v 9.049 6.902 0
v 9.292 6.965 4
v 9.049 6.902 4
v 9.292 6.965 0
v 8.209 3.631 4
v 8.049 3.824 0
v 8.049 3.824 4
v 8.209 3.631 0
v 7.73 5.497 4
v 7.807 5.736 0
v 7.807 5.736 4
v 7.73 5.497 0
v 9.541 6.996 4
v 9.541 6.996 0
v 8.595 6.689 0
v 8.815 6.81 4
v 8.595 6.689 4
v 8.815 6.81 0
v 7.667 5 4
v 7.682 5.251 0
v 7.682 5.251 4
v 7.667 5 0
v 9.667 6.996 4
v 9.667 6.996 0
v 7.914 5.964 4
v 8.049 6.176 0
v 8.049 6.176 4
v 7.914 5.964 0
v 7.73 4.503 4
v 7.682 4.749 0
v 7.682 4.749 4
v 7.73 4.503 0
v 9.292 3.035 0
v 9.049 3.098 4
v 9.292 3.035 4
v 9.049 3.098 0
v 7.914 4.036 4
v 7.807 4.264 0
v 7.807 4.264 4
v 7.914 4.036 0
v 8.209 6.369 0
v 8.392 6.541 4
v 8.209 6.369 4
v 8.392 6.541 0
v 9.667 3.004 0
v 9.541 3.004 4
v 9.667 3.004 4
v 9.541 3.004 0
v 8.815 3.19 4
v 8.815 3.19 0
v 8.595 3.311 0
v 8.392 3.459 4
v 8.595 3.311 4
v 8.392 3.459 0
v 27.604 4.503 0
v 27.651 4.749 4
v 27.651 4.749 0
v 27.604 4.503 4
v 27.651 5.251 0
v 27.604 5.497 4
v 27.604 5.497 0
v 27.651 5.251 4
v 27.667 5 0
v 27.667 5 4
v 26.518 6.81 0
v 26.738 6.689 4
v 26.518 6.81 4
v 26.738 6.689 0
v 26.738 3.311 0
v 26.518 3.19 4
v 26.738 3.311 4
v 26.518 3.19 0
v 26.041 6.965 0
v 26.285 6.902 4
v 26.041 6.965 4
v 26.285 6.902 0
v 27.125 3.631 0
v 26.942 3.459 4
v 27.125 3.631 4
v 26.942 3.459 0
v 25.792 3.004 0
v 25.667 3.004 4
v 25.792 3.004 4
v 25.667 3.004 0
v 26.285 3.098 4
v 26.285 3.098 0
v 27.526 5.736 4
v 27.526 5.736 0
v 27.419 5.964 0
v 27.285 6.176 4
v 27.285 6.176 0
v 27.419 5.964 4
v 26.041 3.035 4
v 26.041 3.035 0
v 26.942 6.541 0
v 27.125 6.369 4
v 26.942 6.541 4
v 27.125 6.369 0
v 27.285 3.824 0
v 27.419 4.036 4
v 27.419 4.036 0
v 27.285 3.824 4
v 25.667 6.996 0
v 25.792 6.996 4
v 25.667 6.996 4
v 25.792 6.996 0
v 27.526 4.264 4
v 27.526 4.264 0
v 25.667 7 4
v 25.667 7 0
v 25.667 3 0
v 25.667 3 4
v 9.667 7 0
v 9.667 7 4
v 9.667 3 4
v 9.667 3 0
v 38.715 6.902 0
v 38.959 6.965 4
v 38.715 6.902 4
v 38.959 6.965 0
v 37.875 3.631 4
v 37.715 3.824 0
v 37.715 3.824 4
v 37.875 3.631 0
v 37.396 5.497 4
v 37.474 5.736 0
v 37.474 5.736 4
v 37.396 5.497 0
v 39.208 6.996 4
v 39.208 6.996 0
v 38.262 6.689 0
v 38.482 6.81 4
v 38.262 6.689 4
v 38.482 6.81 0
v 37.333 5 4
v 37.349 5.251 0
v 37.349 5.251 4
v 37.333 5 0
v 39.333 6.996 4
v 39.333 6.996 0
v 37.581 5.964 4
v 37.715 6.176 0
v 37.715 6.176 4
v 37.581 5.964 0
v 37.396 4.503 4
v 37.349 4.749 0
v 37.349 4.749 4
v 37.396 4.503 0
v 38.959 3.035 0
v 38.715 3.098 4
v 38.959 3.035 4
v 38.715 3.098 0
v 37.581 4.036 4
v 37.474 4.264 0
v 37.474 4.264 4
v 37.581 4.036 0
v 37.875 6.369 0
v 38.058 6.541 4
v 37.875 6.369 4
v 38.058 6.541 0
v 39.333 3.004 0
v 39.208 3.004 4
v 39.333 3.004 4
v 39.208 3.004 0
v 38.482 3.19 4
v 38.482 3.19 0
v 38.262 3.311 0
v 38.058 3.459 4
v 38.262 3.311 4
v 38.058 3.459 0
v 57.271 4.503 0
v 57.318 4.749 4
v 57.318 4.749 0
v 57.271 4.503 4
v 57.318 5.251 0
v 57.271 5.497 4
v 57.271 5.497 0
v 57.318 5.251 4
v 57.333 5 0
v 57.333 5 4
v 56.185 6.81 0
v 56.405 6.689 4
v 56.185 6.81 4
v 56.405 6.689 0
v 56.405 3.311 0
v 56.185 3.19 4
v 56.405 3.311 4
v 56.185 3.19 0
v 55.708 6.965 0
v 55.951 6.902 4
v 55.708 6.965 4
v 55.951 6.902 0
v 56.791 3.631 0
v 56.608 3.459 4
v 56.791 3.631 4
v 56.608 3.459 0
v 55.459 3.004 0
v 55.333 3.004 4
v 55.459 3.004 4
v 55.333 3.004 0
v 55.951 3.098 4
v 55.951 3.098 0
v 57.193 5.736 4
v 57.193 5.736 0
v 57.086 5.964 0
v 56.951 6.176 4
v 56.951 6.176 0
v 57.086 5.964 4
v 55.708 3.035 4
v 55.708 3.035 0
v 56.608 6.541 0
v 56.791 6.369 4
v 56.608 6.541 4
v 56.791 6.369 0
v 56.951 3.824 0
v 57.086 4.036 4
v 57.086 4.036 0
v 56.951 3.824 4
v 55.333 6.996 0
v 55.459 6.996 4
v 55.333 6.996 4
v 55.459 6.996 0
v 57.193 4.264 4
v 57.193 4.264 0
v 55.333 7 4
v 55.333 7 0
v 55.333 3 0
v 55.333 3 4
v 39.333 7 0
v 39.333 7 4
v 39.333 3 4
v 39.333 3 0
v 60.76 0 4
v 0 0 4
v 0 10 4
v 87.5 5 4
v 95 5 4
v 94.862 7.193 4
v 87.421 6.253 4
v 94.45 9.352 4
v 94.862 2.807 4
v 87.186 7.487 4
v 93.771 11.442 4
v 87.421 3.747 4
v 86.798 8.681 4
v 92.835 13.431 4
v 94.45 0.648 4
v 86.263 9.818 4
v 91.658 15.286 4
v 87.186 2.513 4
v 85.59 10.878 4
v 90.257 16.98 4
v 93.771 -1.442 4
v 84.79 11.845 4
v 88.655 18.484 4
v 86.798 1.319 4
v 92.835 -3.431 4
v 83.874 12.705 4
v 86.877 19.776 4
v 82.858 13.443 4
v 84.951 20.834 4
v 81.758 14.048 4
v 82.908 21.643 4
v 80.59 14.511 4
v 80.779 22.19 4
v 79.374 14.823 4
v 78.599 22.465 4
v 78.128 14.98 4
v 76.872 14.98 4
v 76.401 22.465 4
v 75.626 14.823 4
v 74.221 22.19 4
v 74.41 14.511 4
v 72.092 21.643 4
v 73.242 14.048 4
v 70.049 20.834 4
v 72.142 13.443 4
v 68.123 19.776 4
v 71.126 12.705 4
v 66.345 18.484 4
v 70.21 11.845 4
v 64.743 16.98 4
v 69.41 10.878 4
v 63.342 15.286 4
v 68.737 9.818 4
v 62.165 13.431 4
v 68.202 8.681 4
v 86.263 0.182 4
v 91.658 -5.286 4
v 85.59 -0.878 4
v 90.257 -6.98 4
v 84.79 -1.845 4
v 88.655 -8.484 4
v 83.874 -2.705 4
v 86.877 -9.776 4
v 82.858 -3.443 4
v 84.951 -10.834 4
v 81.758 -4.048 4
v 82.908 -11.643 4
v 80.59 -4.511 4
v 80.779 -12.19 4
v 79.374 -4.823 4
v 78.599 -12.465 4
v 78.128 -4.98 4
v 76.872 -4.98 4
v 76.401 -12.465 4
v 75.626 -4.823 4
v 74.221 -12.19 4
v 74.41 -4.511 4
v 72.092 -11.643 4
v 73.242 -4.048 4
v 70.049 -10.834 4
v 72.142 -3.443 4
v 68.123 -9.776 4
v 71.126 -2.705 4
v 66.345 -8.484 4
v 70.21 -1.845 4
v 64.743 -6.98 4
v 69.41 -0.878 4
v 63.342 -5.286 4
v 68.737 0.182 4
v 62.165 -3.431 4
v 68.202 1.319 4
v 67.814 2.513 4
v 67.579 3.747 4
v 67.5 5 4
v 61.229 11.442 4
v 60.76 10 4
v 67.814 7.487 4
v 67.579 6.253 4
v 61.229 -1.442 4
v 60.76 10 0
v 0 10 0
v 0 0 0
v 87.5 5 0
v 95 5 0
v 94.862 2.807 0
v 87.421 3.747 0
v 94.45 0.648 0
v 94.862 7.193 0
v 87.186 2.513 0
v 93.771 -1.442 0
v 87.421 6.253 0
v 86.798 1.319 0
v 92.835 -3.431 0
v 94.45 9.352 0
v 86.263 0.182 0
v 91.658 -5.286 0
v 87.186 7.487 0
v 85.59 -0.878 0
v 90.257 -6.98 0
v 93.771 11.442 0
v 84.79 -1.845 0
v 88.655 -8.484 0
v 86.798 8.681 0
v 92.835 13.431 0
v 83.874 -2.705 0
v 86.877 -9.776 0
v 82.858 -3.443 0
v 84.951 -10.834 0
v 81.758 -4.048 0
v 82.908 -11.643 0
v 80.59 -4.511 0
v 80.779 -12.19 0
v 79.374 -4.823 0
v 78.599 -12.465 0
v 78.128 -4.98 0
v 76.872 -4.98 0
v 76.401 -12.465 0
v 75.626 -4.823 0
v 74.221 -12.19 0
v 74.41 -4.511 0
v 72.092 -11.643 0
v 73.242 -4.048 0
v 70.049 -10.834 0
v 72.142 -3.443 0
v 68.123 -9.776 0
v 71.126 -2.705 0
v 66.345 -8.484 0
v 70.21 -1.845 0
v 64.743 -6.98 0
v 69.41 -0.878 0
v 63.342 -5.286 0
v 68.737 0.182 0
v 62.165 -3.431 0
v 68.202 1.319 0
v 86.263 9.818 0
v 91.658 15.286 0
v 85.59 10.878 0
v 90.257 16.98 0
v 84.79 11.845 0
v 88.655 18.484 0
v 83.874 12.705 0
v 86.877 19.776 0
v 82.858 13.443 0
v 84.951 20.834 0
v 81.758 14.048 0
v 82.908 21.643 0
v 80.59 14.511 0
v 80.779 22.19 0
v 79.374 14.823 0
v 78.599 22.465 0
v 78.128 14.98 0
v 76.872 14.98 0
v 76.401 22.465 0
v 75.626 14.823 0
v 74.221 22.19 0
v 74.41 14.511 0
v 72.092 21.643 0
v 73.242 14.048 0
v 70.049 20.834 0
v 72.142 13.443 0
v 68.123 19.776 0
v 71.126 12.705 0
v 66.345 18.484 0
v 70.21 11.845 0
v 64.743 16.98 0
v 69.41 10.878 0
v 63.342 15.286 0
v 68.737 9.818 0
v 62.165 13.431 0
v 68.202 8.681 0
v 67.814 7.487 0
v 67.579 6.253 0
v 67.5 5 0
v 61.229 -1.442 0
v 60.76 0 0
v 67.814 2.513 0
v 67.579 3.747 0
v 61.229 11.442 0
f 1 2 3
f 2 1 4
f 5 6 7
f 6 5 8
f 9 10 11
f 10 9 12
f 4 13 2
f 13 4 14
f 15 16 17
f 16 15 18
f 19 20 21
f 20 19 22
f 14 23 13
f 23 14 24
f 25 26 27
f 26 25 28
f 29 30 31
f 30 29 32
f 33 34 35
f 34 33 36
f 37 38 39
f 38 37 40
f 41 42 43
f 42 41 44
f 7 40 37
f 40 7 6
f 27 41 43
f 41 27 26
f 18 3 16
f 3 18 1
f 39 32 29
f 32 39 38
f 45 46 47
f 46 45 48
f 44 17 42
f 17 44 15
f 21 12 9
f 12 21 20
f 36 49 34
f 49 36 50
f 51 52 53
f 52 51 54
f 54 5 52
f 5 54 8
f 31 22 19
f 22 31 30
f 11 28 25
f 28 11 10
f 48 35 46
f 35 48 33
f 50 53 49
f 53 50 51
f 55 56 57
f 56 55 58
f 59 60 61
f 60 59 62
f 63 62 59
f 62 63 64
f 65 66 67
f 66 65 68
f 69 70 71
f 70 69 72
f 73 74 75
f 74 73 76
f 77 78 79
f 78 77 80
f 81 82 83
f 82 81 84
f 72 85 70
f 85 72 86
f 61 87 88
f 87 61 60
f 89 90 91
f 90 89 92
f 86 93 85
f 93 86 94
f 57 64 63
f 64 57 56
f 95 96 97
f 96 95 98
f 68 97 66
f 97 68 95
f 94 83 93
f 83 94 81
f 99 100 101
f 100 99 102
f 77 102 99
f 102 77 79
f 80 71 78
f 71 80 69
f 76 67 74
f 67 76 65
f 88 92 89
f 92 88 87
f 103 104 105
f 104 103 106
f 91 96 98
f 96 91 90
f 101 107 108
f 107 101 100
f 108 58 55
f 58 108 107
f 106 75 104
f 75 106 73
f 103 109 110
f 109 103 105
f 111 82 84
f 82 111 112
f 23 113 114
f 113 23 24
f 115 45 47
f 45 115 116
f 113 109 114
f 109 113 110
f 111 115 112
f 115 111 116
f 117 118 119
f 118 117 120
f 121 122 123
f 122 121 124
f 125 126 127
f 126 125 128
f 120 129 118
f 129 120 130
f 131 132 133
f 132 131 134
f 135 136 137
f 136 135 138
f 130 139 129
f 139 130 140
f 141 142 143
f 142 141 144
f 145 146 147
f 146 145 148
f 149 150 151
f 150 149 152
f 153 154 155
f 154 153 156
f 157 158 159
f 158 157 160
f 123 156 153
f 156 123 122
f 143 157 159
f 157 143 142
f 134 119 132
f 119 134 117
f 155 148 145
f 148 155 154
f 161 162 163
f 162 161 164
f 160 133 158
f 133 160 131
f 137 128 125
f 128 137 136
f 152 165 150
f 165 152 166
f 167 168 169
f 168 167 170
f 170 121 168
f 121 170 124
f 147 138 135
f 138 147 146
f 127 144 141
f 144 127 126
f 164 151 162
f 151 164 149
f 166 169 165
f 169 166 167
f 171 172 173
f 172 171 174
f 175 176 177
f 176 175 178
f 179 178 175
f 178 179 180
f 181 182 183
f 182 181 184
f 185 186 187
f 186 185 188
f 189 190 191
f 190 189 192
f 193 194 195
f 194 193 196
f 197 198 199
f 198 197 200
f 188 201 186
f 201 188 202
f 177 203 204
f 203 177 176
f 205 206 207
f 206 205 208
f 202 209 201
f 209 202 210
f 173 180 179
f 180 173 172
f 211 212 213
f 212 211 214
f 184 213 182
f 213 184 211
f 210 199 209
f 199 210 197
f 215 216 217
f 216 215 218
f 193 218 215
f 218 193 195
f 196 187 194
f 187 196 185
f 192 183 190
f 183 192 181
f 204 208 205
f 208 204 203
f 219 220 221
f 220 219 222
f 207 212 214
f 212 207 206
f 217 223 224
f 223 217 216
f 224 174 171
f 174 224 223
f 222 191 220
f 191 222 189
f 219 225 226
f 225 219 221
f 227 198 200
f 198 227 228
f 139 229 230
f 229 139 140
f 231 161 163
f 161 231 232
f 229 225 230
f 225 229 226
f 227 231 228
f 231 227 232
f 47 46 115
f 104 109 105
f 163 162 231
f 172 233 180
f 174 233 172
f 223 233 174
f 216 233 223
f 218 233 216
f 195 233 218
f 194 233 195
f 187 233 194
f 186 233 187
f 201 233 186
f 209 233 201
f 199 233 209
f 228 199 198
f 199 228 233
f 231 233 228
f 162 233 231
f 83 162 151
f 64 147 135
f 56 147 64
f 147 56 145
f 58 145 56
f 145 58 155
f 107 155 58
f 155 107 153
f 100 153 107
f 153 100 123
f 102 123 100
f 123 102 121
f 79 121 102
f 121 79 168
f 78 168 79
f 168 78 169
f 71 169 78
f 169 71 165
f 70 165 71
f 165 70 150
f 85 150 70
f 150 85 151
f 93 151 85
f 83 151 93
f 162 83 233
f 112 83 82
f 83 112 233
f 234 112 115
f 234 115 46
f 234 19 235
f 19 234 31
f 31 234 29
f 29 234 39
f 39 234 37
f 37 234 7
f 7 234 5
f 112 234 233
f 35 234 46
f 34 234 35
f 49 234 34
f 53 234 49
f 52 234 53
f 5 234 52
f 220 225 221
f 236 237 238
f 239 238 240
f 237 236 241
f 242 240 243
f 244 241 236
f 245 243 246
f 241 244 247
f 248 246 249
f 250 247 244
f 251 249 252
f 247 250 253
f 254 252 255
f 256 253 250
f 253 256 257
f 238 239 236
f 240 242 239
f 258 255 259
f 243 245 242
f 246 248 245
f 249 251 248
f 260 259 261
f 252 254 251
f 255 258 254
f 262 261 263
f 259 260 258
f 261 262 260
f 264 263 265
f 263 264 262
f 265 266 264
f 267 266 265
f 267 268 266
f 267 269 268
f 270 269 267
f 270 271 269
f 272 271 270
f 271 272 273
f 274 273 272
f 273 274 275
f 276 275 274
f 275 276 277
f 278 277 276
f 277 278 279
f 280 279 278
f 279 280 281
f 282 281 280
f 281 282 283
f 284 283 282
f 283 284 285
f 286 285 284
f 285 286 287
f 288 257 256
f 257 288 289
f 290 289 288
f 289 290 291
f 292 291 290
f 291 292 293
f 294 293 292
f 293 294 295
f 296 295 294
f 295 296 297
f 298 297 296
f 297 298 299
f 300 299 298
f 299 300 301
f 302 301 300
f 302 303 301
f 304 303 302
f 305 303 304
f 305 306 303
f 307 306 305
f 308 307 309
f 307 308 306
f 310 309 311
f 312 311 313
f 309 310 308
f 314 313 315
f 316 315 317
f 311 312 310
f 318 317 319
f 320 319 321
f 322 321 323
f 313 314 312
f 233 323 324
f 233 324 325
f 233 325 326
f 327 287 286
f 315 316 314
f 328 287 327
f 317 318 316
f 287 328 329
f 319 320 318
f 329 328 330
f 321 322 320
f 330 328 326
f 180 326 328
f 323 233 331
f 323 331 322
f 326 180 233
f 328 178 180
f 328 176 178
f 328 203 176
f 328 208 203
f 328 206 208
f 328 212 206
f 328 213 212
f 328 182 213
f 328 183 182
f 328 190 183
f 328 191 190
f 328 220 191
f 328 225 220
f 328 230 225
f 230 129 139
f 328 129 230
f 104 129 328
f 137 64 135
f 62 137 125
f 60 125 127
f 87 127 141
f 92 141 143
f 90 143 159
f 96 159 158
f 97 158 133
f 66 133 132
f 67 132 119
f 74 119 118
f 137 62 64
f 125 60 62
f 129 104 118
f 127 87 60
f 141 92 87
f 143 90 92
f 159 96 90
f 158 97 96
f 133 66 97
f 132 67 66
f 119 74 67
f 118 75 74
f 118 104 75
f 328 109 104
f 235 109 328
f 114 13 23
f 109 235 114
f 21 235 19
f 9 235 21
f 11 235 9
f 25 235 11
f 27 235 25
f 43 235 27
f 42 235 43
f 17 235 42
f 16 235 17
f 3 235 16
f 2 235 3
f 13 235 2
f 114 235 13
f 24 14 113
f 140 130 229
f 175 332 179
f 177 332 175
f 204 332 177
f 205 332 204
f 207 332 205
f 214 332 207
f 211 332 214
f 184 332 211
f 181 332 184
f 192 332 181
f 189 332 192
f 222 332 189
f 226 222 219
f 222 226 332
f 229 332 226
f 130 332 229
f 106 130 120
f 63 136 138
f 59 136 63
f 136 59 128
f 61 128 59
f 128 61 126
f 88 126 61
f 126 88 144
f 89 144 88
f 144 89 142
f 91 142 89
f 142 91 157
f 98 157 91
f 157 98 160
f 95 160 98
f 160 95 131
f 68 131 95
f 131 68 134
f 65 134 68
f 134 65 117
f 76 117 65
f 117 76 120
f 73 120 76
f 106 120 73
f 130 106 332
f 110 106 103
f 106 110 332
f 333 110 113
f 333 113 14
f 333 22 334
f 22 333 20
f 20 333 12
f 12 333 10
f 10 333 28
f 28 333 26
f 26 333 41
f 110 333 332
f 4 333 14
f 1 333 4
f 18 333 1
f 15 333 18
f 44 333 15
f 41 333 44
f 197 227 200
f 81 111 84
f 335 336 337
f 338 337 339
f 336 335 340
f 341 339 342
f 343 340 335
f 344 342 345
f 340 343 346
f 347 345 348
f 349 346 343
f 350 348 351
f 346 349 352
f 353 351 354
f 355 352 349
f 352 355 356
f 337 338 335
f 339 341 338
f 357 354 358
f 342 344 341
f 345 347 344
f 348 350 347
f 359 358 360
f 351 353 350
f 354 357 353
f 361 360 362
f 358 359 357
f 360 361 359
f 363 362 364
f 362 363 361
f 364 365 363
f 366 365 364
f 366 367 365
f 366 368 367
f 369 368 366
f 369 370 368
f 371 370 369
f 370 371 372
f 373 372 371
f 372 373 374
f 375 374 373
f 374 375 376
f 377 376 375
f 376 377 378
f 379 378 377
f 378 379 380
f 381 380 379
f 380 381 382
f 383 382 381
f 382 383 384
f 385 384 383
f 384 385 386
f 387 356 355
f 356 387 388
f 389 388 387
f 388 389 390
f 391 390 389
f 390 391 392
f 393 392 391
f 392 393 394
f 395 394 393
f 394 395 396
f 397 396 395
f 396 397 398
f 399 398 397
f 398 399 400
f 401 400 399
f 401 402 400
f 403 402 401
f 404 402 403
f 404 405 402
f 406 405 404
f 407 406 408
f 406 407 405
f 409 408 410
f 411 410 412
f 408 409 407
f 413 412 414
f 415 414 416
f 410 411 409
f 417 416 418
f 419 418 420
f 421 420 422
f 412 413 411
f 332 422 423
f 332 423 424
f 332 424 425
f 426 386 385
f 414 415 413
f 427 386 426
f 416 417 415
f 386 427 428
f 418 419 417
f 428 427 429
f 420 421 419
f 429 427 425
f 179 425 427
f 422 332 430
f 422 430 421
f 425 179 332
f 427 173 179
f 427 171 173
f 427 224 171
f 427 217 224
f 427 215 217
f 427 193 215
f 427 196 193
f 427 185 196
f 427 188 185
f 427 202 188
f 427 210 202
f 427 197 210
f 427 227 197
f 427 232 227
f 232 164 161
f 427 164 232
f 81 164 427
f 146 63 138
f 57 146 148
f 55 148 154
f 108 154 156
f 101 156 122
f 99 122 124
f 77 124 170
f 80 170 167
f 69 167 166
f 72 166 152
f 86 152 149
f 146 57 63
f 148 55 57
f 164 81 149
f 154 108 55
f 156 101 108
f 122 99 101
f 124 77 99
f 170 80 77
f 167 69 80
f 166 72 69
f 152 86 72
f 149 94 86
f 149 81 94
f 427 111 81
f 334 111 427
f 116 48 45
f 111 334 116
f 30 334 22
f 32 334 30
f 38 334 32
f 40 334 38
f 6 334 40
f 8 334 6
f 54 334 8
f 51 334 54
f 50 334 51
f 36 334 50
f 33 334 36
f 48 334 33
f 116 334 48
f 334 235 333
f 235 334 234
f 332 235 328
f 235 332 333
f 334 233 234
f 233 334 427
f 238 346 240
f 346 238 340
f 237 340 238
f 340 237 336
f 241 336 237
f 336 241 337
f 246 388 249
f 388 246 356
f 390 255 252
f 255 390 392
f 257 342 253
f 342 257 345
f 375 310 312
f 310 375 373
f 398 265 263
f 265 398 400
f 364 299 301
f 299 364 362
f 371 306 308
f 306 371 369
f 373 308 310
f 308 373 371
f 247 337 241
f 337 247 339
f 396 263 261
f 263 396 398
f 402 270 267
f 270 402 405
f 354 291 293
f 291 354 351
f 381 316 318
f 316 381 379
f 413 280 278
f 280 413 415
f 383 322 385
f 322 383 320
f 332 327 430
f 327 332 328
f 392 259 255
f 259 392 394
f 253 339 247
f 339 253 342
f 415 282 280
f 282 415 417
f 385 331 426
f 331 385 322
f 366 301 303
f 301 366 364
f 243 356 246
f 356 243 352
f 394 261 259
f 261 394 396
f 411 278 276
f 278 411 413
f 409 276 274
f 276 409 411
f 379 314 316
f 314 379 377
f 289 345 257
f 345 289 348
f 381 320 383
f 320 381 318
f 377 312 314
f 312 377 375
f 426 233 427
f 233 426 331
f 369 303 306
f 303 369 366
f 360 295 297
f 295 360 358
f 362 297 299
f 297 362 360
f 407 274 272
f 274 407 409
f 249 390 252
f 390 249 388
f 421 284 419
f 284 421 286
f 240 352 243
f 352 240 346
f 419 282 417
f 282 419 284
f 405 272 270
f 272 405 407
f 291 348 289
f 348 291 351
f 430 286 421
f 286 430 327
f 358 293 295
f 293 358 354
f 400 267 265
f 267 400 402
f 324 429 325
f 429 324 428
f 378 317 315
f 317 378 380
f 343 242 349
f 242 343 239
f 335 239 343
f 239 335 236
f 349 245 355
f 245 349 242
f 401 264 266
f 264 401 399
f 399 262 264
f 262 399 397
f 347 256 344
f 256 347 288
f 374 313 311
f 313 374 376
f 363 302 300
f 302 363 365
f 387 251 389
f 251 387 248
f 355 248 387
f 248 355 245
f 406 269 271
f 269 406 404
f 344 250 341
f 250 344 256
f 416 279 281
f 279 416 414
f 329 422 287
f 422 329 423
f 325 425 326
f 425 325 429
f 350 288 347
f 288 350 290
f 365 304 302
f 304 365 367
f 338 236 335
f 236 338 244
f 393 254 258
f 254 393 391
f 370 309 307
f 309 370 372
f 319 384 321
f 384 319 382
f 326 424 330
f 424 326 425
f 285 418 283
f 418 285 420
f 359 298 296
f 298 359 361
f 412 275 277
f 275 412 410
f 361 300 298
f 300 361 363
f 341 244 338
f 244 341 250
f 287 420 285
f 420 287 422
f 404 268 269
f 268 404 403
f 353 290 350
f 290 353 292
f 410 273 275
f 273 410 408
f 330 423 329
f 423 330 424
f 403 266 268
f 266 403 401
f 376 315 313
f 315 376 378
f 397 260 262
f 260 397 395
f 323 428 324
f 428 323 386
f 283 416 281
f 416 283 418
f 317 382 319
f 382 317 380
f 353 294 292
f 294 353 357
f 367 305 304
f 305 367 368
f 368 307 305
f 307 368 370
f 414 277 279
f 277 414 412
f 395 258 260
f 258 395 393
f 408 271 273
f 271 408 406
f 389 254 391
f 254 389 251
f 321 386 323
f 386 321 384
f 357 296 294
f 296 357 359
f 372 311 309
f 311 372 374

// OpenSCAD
adapter_fanmount_length=65; //Overall length of the piece that attaches to the Wanhao i3 (or clone) fan mount.
adapter_fanmount_width=10;  //Width of fan mount
adapter_fanmount_depth=4;  //Thickness of the fan mount
adapter_fanmount_hole_length=20;  //Length of the two holes for the fan mount.  Making it longer allows for adjustability.
adapter_fanmount_hole_width=4;  //Width of the fan mount holes.
probe_mount_diameter_inner=20; //Probe diameter + 1-2mm
probe_mount_diameter_outer=35; //Outside dimeter of the piece the probe mounts to.
probe_depth=4;  //Thickness of the probe mount.
adapter_probe_overlap=5; //The overlap between the fan mount side and the probe mount side.
adapter_probe_offset=0; //The vertical offset between the fan mount and probe mount.  Allows for the probe to mount higher or lower than the fan mount.
$fn=50;

adapter();

module adapter() {
union() {
    fanmount();
    translate([adapter_fanmount_length+probe_mount_diameter_outer/2-adapter_probe_overlap,adapter_fanmount_width/2,adapter_probe_offset])
    probemount();
    translate([adapter_fanmount_length-adapter_probe_overlap,0,0])
    cube([adapter_probe_overlap,adapter_fanmount_width,adapter_fanmount_depth+adapter_probe_offset]);
}
}

module probemount() {
difference() {
cylinder(d=probe_mount_diameter_outer,h=probe_depth);
translate([0,0,-0.1])
cylinder(d=probe_mount_diameter_inner,h=probe_depth+0.2);
}
}

module fanmount() {
difference() {
cube([adapter_fanmount_length,adapter_fanmount_width,adapter_fanmount_depth]);
translate([adapter_fanmount_length/3-adapter_fanmount_hole_width,adapter_fanmount_width/2,-0.1])
fanmount_holes();
translate([adapter_fanmount_length*2/3+adapter_fanmount_hole_width,adapter_fanmount_width/2,-0.1])
fanmount_holes();
}
}

module fanmount_holes() {
translate([-(adapter_fanmount_hole_length-adapter_fanmount_hole_width)/2,0,0]) {
cylinder(d=adapter_fanmount_hole_width,h=adapter_fanmount_depth+0.2);
translate([adapter_fanmount_hole_length-adapter_fanmount_hole_width,0,0])
cylinder(d=adapter_fanmount_hole_width,h=adapter_fanmount_depth+0.2);
translate([0,-adapter_fanmount_hole_width/2,0])
cube([adapter_fanmount_hole_length-adapter_fanmount_hole_width,adapter_fanmount_hole_width,adapter_fanmount_depth+0.2]);
}
}
